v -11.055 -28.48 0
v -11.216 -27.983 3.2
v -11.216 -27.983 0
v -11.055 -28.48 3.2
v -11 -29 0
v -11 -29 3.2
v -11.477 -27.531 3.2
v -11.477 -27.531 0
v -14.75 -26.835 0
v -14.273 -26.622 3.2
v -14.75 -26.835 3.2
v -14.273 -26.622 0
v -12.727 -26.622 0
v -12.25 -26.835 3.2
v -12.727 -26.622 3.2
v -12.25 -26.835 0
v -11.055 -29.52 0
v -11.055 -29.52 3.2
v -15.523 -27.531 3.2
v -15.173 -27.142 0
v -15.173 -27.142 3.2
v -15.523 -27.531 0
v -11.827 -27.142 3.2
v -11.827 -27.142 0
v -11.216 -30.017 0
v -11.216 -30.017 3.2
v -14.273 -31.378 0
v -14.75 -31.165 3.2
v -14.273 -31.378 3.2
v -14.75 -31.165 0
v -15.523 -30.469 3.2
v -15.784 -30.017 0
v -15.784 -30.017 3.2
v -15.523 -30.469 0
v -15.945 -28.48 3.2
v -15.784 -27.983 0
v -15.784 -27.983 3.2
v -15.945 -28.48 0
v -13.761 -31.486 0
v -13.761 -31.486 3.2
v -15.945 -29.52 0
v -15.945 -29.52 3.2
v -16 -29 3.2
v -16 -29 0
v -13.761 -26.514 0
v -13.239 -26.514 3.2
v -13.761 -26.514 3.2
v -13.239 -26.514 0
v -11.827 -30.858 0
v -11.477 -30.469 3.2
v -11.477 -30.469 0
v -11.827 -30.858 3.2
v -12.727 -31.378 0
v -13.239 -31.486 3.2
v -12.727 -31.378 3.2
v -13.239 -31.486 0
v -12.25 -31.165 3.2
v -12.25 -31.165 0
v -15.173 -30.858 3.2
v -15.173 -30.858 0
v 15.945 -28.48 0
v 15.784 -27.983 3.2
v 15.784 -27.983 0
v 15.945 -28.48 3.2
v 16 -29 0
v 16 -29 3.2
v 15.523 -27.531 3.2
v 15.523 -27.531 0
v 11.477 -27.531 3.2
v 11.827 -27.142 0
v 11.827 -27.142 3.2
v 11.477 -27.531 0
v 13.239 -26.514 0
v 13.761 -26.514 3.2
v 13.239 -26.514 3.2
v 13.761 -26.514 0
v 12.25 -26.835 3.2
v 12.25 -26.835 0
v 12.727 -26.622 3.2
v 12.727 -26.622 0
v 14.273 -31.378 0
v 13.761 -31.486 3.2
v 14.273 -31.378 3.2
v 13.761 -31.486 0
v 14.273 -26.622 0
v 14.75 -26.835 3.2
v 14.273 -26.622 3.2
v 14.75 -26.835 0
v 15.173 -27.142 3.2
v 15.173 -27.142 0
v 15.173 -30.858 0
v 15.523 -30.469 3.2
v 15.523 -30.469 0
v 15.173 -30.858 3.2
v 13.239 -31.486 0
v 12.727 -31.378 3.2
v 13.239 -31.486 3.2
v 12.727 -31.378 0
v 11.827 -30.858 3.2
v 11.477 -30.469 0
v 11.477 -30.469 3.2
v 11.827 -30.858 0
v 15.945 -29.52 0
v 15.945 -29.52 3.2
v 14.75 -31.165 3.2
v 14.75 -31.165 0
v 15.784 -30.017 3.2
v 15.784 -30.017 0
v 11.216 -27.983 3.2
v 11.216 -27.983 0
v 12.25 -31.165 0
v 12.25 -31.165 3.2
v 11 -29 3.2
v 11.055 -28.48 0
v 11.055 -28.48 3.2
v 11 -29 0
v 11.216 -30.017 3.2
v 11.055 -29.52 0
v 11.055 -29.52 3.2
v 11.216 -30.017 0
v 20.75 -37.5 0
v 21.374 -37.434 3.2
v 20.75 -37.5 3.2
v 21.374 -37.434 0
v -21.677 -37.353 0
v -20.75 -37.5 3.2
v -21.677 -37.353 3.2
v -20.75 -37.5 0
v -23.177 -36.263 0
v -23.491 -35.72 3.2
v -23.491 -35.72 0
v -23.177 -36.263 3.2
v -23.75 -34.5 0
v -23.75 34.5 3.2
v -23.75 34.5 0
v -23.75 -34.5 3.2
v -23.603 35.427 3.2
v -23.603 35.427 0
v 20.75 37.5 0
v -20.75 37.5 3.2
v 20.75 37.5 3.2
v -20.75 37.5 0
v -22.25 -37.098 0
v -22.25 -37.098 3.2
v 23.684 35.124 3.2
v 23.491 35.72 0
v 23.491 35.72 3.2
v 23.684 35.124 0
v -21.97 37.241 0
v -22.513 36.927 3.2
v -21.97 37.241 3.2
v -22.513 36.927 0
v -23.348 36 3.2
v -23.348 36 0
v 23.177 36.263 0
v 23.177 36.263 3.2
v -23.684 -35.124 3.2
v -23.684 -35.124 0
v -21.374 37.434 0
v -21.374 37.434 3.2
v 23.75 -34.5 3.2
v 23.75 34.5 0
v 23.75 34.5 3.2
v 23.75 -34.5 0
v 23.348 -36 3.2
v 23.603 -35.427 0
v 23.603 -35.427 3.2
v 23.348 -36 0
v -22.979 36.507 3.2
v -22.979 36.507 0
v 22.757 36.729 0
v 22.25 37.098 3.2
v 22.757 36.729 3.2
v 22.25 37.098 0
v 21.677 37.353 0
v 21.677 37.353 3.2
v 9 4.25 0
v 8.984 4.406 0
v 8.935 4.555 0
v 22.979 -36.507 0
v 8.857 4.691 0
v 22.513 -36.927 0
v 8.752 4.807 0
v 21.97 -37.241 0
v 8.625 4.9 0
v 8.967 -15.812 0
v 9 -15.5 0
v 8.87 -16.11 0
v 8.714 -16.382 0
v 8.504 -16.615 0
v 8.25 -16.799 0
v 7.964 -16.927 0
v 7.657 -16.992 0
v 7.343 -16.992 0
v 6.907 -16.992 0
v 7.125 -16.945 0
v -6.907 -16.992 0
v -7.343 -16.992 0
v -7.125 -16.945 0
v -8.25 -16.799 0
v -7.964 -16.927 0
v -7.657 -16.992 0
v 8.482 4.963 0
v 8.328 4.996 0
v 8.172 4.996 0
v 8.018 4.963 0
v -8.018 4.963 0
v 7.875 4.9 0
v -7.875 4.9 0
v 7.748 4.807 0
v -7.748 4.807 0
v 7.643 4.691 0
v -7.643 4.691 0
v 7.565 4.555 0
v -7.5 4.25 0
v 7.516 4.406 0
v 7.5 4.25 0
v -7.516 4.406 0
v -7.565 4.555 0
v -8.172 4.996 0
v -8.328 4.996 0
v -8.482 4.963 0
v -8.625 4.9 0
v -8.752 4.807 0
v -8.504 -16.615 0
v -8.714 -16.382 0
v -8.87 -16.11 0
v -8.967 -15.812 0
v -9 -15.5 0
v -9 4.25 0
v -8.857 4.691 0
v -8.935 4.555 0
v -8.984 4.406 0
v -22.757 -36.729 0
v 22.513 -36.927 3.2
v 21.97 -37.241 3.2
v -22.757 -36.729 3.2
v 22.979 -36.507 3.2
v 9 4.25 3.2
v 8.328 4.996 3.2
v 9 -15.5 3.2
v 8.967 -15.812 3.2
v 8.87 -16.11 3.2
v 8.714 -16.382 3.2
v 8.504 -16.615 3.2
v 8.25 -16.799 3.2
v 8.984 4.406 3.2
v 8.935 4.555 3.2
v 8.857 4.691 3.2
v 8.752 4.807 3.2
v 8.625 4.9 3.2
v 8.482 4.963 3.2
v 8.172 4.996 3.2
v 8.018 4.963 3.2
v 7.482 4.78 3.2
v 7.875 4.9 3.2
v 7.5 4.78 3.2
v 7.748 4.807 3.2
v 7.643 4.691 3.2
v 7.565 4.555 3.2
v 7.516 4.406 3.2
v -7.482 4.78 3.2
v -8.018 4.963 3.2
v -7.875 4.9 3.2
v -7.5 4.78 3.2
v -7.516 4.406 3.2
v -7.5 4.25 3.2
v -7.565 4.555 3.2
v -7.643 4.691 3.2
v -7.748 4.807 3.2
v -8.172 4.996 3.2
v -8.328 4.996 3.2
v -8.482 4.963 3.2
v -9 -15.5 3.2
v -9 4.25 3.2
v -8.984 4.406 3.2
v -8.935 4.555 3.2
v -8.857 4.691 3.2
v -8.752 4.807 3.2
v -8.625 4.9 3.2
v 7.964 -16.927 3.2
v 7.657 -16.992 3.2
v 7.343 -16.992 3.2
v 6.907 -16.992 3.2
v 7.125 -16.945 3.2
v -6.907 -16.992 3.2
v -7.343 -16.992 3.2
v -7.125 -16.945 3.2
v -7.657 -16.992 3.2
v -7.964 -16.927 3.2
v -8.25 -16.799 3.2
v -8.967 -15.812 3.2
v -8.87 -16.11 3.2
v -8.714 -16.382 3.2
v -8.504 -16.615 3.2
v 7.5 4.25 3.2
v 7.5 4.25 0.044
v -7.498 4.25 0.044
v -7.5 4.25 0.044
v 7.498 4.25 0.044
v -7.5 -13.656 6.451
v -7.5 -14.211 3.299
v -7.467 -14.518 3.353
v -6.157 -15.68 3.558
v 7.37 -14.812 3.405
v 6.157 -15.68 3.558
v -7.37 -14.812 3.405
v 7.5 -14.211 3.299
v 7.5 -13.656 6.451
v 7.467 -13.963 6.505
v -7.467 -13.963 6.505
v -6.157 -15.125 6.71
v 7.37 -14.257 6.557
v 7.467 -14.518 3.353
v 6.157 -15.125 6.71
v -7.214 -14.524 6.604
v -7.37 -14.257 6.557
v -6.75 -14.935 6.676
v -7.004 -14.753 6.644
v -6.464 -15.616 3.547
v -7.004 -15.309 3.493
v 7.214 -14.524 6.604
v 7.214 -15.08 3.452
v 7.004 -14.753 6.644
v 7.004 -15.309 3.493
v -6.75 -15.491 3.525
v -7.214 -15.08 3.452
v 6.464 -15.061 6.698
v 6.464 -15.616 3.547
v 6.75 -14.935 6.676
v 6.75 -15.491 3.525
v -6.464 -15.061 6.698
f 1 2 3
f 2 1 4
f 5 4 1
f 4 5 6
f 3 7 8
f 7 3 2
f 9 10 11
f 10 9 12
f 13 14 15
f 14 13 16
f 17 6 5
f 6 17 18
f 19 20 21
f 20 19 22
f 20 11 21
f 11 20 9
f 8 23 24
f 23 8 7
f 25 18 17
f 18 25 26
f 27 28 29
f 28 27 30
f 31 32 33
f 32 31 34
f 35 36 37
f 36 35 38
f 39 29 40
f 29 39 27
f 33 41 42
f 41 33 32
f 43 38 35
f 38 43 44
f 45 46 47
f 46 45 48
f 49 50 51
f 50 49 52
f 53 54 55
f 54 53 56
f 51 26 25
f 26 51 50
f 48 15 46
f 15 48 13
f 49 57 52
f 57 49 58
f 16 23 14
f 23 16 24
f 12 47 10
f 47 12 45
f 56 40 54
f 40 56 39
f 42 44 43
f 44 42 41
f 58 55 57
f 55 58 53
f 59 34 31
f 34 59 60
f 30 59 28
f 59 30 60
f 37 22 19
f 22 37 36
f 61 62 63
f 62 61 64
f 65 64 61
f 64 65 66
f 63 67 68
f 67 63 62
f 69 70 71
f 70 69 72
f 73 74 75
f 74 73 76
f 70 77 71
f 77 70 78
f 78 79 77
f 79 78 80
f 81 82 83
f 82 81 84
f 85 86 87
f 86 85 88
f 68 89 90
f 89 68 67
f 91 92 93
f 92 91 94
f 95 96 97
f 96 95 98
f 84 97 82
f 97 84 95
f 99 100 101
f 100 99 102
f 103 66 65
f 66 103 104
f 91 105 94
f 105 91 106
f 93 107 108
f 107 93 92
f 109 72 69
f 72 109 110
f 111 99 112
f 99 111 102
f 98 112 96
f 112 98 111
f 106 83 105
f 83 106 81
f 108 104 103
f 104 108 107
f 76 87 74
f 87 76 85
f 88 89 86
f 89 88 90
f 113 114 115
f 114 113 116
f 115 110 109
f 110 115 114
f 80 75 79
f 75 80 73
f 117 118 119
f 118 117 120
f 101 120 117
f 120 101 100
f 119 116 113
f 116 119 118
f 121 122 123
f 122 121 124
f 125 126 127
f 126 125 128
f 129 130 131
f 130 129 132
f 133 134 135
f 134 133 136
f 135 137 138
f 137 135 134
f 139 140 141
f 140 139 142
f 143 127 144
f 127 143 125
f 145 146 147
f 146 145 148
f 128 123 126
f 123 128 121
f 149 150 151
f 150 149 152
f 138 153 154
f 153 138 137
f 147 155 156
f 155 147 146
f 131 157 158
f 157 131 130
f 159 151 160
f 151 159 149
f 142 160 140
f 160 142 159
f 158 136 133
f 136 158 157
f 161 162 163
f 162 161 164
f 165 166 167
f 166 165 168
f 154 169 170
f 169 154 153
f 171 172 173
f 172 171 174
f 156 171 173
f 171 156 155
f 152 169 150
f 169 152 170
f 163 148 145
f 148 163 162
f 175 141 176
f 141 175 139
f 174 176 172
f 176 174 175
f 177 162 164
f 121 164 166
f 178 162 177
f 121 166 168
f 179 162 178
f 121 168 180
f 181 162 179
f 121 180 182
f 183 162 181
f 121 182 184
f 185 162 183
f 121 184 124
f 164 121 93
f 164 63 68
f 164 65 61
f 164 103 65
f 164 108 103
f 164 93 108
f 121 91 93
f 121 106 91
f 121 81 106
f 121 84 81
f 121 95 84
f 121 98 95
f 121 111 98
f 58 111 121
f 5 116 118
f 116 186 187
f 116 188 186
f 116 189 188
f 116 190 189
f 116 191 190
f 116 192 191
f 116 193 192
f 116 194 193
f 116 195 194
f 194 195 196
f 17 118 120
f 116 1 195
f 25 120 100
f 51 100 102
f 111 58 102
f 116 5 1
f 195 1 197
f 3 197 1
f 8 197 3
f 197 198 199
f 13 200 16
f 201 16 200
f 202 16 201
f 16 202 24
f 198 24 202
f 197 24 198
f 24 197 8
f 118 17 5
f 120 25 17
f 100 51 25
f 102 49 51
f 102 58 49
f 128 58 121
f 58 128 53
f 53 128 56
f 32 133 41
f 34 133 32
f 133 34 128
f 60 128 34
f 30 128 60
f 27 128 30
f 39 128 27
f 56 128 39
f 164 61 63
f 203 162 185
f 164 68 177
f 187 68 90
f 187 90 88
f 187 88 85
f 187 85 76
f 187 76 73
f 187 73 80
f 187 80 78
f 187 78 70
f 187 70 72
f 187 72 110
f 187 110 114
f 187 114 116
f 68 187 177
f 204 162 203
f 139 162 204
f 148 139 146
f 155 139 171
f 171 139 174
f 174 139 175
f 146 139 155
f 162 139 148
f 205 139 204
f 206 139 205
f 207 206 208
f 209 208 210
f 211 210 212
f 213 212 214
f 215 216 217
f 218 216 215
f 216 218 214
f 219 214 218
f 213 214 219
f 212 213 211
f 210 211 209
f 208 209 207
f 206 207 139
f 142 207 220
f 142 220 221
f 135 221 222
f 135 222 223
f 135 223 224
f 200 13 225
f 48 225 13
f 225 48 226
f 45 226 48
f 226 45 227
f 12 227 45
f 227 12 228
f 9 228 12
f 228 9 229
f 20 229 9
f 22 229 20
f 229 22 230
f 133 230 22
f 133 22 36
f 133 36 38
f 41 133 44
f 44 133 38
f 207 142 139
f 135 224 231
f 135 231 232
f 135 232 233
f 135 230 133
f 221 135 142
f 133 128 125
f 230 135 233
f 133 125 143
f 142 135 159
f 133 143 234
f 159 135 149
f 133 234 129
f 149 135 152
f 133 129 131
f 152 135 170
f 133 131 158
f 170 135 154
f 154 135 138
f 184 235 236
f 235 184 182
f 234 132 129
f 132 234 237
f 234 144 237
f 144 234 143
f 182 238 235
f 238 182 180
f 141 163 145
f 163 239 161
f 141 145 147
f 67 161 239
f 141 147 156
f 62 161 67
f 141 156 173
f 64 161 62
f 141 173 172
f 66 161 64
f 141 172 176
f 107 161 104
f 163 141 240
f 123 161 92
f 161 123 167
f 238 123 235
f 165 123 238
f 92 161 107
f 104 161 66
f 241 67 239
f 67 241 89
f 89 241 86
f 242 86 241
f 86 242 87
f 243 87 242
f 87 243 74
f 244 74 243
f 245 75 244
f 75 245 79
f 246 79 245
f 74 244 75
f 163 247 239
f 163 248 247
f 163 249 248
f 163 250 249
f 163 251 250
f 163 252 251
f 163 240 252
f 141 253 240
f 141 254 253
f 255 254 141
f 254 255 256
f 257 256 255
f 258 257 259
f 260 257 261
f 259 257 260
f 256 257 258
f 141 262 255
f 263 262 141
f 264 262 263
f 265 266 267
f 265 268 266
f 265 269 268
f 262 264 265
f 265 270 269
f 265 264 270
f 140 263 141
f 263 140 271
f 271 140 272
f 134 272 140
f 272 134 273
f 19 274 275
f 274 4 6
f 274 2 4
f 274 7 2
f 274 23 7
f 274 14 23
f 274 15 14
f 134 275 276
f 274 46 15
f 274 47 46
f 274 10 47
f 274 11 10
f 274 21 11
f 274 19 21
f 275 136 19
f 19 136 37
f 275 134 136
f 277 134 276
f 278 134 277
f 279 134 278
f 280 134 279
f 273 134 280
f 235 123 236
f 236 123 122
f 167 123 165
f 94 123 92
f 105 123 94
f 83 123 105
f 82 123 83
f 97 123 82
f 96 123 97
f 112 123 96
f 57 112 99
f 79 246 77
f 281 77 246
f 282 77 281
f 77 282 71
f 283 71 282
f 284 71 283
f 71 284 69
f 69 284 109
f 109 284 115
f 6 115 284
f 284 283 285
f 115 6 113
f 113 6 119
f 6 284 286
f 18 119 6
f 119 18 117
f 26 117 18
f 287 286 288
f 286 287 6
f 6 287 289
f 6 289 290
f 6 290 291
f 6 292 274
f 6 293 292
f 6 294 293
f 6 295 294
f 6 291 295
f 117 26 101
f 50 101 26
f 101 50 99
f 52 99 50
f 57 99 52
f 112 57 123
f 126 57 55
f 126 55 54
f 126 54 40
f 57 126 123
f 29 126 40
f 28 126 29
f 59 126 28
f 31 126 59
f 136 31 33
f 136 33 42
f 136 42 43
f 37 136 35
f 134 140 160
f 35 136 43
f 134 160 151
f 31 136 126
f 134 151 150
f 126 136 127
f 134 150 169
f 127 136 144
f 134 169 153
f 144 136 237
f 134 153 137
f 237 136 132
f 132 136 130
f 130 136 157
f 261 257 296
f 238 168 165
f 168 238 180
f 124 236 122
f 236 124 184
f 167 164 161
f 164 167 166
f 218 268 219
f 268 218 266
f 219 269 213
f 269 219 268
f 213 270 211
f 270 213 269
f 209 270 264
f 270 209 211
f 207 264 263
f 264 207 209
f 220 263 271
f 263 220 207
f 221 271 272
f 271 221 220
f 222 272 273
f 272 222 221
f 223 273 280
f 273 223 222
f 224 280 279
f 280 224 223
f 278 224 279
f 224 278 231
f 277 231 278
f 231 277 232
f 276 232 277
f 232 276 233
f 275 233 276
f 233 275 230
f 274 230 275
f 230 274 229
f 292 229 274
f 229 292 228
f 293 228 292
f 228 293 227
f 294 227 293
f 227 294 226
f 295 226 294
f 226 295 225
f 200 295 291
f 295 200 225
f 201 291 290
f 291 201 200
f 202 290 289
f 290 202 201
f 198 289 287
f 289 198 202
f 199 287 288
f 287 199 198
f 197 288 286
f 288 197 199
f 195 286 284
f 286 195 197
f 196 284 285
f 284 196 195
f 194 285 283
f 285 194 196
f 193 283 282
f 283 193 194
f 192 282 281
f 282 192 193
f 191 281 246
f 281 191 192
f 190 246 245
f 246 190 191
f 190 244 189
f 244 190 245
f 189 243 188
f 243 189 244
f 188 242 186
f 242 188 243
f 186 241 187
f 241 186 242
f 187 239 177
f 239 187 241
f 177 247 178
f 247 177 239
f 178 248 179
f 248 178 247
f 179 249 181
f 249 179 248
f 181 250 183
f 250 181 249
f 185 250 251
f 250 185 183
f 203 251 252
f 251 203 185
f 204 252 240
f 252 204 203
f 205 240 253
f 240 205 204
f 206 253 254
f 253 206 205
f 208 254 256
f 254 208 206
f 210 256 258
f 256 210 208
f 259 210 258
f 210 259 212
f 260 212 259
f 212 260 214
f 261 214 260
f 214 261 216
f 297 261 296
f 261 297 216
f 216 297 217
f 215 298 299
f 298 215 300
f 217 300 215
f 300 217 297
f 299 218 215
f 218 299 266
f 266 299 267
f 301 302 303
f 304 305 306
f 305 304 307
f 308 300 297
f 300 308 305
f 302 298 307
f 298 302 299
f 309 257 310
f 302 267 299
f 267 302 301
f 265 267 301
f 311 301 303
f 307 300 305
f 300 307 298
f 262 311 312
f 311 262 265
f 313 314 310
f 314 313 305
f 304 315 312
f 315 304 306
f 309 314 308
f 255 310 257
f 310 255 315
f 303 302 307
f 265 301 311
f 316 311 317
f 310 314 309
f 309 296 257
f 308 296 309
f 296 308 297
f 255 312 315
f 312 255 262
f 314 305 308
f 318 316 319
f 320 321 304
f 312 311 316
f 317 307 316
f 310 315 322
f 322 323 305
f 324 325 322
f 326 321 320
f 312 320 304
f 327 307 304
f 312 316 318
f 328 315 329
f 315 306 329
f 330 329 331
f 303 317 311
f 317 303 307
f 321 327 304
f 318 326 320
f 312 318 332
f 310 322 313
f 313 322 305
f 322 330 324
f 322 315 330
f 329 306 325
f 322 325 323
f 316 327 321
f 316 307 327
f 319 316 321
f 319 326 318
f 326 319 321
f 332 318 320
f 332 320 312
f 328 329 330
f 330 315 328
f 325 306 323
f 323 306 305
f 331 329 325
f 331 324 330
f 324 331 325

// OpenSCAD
// PDU Mounting plate

WIDTH = 47.5;
LENGTH = 75;

TAB_WIDTH = 15;
TAB_LENGTH = 19;
TAB_SPACE = 1.5;
TAB_OFFSET = (LENGTH/2)-33;

difference() {
  // Plate
  linear_extrude(3.2) rounded_rectangle(WIDTH, LENGTH, 3);
  
  // Tab hole
  translate([0,-TAB_OFFSET-TAB_LENGTH/2,-1]) linear_extrude(5)
  {
    r = TAB_SPACE/2;
    osr = 2*TAB_SPACE/2;
    translate([TAB_WIDTH/2+r,0,0]) hull() {
      translate([-osr/2,-osr]) circle(osr);
      translate([0,TAB_LENGTH-r]) circle(r);
    }
    translate([-TAB_WIDTH/2-r,0,0]) hull() {
      translate([osr/2,-osr]) circle(osr);
      translate([0,TAB_LENGTH-r]) circle(r);
    }
    translate([TAB_WIDTH/2,0,0]) hull() {
      translate([-TAB_WIDTH+osr/2,-osr]) circle(osr);
      translate([-osr/2,-osr]) circle(osr);
    }
    translate([-TAB_WIDTH/2,-r, 0]) hull() {
      square([TAB_WIDTH, TAB_LENGTH]);
    }
  };
  
  // Screw holes
  translate([-27/2,-LENGTH/2 + 8.5,-1]) {
    cylinder(d=5,h=5);
    translate([27,0,0]) cylinder(d=5,h=5);
  }
}

// translate([0,TAB_OFFSET,0]) cylinder(d=1,h=10);

// Tab
//translate([-TAB_WIDTH/2,-TAB_OFFSET,0])
translate([TAB_WIDTH/2,TAB_OFFSET,0]) rotate([10,0,180]) linear_extrude(3.2) hull() {
  square([TAB_WIDTH, 1]);
  //translate([0,TAB_LENGTH]) square([TAB_WIDTH, 1]);
  r = 1.5;
  translate([r,TAB_LENGTH]) circle(r);
  translate([TAB_WIDTH-r,TAB_LENGTH]) circle(r);
}
  

$fn = 30;


// Rounded rectangle module
// w = width, h = height, r = corner radius
module rounded_rectangle(w, h, r) {
    if (r > min(w, h)/2) {
        r = min(w, h)/2; // Clamp radius so it doesn’t exceed rectangle size
    }
    offset(r) offset(-r)
        square([w, h], center=true);
}
